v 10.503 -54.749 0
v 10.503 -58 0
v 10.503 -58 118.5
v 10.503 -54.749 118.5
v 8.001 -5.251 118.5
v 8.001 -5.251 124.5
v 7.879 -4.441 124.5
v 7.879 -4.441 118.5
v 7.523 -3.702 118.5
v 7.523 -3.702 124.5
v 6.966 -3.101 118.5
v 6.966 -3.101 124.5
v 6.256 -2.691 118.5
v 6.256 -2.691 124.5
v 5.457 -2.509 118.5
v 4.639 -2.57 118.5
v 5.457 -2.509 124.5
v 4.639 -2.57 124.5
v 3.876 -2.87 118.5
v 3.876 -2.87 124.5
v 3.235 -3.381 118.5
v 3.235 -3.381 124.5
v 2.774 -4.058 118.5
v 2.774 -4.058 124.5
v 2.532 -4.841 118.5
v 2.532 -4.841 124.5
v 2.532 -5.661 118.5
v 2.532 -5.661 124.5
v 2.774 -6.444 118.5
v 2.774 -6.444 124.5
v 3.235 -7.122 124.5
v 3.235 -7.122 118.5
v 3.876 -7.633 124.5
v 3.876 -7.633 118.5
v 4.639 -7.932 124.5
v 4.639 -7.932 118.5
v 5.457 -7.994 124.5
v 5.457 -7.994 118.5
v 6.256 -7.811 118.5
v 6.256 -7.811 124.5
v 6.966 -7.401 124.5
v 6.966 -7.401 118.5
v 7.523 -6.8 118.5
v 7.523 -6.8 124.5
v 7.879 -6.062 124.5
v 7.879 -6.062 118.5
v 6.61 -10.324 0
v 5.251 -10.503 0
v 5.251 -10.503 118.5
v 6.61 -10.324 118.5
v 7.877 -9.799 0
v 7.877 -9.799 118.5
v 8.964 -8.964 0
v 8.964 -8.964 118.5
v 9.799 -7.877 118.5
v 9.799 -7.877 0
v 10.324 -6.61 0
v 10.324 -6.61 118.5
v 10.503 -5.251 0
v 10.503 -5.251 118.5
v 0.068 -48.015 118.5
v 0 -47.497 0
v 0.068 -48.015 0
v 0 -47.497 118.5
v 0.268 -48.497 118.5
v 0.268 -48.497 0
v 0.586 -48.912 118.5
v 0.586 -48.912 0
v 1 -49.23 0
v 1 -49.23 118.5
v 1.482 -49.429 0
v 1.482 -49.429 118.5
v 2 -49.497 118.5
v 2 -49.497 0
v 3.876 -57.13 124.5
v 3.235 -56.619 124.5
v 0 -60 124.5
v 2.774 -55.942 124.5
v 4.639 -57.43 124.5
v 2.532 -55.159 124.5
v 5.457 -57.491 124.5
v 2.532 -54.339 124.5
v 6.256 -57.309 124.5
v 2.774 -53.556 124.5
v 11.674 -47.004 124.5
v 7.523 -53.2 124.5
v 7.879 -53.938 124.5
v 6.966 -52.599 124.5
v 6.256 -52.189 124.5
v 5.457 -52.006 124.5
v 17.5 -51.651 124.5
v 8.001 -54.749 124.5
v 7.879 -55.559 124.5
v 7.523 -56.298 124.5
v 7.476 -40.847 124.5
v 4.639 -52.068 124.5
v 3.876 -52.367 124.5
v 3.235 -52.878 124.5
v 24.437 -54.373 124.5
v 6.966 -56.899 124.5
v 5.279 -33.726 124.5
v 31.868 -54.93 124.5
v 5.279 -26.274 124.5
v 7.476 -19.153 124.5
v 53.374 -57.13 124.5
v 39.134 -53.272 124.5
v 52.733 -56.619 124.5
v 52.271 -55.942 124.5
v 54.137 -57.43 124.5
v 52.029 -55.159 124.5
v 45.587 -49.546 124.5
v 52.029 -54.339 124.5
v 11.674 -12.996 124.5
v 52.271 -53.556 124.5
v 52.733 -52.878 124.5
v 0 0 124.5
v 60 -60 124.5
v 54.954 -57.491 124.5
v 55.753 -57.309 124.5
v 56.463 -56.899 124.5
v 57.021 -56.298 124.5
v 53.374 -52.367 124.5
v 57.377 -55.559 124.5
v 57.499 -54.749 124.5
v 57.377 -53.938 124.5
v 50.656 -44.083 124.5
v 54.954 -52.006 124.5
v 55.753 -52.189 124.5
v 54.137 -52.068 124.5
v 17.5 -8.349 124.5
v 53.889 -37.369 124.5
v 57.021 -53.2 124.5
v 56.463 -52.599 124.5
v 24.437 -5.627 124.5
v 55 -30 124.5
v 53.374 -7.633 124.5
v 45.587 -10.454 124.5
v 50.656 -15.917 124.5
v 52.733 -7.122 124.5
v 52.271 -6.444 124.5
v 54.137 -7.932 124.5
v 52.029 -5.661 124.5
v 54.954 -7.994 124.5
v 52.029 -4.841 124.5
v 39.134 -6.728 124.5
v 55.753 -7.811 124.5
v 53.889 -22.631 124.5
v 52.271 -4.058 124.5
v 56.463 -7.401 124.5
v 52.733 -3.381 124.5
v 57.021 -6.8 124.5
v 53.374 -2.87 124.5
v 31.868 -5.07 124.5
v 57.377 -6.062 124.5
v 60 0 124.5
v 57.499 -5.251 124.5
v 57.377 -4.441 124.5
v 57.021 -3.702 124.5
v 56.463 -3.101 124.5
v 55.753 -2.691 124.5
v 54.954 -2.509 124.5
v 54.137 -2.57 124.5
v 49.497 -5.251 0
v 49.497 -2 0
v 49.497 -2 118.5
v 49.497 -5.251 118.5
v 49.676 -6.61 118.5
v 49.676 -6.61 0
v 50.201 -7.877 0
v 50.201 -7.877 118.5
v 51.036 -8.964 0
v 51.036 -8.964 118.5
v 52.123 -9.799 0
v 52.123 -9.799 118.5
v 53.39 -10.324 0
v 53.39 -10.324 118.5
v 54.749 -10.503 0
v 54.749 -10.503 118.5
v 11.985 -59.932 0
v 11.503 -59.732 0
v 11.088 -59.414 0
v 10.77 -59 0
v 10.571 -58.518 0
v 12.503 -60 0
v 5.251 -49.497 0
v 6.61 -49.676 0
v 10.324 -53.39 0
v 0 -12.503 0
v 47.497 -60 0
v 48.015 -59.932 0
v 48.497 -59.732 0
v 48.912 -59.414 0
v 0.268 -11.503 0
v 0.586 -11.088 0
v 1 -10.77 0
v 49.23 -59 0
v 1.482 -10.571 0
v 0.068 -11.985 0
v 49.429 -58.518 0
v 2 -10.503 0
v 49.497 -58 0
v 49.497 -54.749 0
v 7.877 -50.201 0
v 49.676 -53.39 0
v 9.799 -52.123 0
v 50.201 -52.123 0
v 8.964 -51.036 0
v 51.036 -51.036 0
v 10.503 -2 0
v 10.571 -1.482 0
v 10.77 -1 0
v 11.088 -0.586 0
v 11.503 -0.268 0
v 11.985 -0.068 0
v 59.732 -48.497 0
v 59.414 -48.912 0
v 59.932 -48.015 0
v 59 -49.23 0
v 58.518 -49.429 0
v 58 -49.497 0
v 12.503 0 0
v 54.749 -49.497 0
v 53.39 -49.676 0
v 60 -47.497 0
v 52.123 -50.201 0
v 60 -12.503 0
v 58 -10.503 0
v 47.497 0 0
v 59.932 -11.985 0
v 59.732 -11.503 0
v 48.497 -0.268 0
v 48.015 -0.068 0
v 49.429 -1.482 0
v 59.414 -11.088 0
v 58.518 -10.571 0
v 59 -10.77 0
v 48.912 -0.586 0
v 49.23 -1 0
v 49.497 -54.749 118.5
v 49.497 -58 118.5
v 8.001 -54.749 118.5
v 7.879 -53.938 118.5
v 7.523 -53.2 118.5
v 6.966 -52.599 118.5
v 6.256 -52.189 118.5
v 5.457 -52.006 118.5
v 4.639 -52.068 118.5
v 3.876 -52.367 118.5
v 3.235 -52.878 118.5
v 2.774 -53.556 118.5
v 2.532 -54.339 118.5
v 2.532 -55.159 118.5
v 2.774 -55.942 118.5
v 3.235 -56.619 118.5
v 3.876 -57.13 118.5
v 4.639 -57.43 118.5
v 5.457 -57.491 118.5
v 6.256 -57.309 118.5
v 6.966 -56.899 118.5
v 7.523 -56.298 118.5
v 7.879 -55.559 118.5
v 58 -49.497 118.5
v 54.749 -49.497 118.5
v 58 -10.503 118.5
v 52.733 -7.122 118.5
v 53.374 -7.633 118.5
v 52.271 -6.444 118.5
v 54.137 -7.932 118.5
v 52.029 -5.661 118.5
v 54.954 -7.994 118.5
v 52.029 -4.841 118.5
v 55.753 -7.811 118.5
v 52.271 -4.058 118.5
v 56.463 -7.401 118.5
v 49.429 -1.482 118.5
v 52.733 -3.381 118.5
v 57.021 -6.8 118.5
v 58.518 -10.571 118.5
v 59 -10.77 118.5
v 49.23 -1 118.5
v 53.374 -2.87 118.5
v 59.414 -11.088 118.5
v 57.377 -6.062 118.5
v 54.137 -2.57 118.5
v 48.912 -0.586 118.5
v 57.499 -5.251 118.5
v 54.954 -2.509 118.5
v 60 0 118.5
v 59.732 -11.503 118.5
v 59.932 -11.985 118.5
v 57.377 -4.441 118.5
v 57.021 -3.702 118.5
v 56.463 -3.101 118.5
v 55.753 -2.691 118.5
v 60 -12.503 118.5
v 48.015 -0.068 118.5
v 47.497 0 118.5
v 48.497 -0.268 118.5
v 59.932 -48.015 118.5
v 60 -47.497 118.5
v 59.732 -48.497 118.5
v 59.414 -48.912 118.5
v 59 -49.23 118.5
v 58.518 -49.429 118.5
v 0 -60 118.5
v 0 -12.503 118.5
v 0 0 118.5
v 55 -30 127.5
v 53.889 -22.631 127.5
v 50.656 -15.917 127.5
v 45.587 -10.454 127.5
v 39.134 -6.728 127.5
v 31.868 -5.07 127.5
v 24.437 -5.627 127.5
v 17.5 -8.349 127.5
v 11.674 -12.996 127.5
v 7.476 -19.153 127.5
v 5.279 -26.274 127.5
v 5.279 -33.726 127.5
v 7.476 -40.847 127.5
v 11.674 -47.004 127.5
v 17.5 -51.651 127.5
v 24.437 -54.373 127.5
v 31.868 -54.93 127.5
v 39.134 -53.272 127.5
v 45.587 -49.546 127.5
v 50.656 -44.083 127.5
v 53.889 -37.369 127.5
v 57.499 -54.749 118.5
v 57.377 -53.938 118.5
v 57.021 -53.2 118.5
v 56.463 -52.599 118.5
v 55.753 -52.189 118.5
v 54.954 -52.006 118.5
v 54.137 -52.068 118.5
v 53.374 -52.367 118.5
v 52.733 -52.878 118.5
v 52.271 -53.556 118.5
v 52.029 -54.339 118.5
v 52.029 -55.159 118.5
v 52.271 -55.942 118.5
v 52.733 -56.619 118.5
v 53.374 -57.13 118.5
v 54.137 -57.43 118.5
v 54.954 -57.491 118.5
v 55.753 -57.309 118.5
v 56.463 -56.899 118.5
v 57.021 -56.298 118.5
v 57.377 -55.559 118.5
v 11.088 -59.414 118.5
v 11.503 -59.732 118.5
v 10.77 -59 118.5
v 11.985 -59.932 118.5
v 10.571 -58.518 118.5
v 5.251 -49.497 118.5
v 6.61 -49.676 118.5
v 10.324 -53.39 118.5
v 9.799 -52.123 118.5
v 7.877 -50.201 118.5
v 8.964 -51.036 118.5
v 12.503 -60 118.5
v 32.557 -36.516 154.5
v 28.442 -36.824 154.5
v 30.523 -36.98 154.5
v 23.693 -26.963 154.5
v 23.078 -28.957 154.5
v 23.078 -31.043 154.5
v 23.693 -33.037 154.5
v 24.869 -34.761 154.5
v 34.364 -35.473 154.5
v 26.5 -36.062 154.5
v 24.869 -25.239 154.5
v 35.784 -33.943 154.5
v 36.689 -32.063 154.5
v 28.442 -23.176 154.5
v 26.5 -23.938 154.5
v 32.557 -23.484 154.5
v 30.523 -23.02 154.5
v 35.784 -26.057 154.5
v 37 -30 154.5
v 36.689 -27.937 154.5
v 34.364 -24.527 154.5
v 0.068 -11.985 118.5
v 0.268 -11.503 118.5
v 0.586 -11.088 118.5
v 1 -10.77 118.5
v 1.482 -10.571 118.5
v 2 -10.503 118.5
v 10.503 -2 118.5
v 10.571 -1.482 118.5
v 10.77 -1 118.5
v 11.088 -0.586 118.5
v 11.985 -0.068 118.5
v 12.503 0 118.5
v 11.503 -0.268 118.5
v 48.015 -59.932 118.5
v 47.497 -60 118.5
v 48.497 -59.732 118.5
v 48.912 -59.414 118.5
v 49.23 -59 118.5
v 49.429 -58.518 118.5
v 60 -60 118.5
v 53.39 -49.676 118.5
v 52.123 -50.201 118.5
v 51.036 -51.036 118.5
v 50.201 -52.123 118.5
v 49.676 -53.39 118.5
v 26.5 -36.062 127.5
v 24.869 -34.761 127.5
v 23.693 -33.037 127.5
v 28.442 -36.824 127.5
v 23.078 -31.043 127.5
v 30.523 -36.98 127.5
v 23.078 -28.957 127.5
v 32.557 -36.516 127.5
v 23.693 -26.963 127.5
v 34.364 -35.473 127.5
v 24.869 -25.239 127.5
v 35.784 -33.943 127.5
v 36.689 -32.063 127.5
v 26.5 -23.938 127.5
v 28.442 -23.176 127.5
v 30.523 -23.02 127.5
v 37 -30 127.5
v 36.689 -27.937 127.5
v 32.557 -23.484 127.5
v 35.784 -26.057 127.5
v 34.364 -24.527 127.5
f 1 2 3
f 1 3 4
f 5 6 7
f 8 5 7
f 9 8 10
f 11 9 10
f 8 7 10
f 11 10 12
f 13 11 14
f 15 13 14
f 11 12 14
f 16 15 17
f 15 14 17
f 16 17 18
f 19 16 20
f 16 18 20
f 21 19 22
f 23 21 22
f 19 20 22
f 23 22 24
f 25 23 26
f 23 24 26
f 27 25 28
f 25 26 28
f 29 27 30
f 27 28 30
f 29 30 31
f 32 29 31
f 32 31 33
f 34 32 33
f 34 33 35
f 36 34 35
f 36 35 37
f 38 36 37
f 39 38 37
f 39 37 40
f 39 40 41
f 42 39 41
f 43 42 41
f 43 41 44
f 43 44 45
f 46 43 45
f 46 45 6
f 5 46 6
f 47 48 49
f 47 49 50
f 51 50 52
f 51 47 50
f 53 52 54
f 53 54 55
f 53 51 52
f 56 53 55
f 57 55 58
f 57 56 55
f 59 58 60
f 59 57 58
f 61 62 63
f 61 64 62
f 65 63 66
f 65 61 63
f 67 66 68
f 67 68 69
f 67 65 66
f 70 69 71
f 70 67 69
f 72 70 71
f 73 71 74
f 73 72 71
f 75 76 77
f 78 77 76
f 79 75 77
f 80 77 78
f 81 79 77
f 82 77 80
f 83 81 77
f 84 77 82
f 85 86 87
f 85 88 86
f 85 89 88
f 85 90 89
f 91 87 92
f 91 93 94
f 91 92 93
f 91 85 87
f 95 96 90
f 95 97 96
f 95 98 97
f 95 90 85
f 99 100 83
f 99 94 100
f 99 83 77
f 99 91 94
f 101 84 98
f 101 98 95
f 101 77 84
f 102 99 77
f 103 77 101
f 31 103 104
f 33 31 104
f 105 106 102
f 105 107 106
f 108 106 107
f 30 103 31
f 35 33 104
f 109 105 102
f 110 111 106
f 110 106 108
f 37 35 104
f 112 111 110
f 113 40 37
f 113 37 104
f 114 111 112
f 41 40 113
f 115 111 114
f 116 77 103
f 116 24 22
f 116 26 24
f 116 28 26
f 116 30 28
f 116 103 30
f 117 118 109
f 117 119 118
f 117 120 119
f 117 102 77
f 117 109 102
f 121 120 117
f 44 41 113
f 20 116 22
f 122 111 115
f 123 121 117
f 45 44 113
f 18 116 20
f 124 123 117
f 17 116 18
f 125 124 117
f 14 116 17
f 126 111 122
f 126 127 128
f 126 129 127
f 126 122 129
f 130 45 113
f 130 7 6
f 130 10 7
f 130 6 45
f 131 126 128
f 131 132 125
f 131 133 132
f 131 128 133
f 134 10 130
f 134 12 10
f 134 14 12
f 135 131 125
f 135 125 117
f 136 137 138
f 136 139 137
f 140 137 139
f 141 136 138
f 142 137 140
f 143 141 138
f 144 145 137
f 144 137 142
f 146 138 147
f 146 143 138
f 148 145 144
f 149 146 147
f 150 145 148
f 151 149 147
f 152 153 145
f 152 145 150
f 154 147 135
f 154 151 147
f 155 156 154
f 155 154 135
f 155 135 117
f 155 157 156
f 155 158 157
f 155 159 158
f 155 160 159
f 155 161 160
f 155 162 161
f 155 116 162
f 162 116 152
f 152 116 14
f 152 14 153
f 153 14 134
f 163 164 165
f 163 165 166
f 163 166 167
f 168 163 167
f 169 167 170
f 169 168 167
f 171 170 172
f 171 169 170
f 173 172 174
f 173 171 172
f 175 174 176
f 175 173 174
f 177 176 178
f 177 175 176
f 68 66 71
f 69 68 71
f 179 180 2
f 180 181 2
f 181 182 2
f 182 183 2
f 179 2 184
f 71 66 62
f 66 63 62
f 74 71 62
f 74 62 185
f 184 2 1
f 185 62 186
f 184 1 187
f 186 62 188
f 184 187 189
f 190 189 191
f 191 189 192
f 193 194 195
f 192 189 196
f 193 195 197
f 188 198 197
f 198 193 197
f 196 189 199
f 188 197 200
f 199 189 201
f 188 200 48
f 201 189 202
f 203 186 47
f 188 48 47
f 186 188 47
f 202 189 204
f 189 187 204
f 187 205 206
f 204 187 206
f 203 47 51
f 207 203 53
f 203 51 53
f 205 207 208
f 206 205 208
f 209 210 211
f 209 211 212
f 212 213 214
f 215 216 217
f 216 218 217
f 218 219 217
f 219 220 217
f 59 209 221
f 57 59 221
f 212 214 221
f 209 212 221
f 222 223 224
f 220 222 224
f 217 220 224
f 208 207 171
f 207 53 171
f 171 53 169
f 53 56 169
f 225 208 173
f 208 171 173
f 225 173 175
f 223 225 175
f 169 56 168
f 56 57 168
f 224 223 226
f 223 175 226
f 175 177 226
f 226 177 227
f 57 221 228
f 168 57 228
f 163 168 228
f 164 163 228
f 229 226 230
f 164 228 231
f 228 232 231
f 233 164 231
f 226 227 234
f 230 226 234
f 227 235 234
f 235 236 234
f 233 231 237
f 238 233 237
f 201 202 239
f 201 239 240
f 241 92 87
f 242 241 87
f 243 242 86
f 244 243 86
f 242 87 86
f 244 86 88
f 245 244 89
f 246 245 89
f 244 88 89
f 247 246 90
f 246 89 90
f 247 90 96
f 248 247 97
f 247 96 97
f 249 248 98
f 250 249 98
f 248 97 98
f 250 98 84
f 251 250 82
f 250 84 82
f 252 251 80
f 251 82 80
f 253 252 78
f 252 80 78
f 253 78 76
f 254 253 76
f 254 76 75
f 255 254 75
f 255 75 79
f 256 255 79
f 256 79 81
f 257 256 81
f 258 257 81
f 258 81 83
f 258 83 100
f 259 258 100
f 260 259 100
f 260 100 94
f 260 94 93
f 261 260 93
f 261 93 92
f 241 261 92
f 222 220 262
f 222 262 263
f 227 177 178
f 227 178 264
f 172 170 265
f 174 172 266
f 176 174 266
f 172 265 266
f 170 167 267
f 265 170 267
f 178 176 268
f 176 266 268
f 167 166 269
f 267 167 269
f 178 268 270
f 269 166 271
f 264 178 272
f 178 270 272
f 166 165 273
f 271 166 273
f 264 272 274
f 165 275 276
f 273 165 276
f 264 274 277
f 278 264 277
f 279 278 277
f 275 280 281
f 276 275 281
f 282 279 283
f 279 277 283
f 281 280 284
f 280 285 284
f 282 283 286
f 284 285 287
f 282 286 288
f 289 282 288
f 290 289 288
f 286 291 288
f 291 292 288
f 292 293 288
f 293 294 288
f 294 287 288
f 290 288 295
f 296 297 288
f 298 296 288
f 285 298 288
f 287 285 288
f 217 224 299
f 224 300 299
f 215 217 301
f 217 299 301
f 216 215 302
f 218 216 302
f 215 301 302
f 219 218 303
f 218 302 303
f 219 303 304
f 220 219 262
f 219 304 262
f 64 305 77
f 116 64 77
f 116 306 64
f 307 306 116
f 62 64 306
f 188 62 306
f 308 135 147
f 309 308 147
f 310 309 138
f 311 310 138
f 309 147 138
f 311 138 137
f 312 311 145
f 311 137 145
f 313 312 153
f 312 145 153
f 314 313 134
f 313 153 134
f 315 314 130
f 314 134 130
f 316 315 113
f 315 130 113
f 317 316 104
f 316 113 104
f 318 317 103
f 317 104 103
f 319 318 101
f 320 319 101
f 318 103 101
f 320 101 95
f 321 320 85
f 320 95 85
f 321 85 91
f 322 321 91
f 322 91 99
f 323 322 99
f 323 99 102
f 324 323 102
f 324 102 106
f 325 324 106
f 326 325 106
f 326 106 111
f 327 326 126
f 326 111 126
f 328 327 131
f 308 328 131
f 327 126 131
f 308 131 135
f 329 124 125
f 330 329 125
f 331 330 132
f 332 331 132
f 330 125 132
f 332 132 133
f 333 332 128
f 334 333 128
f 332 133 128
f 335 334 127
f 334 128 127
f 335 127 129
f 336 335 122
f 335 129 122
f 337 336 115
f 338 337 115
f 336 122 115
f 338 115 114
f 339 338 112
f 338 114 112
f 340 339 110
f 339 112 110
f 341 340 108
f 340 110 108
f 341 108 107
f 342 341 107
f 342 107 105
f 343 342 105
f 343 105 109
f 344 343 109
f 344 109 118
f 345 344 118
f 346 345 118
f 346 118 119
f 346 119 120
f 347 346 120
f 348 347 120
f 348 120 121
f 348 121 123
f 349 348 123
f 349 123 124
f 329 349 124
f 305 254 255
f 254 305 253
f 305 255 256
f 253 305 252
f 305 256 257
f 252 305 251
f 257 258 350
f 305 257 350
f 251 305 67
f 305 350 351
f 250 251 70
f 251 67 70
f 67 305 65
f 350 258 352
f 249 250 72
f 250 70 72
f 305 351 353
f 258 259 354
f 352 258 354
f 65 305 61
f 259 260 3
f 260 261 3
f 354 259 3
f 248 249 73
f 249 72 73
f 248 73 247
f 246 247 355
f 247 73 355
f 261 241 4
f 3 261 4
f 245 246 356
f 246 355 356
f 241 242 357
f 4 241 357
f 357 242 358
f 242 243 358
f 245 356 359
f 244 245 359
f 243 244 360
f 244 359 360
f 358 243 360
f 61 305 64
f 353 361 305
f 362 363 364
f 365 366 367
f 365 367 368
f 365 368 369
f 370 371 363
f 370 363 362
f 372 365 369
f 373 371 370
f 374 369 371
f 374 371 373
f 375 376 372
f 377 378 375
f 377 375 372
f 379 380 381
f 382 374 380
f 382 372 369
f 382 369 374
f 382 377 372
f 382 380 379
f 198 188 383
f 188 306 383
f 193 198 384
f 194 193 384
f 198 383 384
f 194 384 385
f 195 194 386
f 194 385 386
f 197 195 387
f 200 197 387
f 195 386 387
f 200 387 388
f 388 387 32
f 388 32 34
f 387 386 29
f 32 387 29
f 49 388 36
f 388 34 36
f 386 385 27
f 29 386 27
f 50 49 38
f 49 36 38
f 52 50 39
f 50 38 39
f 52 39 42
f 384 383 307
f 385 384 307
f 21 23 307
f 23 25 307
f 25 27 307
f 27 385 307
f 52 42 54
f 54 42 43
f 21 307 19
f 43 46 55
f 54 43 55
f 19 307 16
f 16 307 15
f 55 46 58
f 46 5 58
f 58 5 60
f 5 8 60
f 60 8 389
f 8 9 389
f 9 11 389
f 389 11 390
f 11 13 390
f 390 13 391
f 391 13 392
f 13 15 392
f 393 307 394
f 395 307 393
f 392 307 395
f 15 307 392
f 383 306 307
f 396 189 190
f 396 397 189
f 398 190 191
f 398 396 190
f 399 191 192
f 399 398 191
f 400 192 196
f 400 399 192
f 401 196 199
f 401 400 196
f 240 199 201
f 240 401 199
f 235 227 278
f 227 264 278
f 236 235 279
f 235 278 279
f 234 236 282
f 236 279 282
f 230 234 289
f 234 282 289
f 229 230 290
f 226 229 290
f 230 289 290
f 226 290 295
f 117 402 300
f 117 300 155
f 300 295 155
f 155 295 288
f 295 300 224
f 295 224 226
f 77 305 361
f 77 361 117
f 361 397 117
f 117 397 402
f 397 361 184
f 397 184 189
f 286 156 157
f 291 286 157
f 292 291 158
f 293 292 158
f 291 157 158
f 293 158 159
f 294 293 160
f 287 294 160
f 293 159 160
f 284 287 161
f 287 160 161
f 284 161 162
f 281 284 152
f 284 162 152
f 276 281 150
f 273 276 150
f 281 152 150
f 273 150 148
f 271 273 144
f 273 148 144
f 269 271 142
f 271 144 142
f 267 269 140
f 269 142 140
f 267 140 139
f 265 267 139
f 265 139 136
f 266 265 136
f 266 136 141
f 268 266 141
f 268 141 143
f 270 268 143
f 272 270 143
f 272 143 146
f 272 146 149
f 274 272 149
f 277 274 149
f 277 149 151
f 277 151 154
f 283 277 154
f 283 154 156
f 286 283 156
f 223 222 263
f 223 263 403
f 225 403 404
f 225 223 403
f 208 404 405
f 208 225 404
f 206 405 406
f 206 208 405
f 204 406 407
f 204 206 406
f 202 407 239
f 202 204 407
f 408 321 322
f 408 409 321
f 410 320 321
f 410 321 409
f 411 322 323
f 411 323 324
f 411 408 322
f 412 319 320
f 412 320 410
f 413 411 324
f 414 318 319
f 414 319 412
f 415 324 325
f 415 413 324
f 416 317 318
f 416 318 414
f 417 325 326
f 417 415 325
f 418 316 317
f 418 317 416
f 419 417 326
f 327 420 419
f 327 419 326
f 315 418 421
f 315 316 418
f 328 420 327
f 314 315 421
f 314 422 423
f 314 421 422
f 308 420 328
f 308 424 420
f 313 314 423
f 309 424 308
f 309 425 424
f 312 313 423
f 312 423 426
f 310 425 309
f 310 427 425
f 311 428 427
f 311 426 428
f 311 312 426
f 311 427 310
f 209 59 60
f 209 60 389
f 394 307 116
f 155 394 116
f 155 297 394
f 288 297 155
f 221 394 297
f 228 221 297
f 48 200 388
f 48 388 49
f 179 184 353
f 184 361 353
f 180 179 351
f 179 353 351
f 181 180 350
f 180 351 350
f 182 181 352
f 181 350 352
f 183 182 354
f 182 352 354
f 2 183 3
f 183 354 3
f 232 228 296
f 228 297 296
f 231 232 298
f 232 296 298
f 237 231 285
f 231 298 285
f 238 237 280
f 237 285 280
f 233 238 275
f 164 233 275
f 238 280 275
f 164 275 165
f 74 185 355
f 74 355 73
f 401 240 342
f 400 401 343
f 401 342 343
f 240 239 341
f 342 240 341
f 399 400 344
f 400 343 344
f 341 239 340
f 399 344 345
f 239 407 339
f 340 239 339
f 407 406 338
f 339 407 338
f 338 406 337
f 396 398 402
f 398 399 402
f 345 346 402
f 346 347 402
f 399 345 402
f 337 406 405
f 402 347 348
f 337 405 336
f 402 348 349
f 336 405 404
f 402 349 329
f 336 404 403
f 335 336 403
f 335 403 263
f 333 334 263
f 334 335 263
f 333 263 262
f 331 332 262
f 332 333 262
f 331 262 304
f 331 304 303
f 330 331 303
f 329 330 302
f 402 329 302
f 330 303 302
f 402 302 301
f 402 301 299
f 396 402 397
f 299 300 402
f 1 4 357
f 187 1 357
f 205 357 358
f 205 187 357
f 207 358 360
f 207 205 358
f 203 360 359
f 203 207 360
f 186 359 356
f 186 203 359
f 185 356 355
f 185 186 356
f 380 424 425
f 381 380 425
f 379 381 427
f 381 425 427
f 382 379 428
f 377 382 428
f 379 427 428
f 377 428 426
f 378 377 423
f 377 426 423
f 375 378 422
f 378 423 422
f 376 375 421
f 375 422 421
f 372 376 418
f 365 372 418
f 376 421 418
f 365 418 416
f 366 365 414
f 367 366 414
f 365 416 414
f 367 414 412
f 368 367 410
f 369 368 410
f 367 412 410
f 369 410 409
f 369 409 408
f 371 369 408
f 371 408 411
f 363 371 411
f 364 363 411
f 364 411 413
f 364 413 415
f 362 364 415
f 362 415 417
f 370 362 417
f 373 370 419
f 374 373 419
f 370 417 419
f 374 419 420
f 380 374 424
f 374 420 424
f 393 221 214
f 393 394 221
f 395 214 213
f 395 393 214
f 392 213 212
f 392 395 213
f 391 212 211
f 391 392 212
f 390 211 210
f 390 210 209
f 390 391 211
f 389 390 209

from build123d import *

# Parameters (mm, degrees)
SKETCH_1_W          = 60
SKETCH_1_H          = 60
EXTRUDE_1_DEPTH     = 124.5
SKETCH_2_R          = 25
EXTRUDE_2_DEPTH     = 3
SKETCH_3_R          = 7
EXTRUDE_3_DEPTH     = 27
SKETCH_4_R          = 2.75
CUT_EXTRUDE_1_DEPTH = 151.666021385
CUT_EXTRUDE_2_DEPTH = 118.5
FILLET_1_R          = 2


with BuildPart() as part:
    # 草图1 → 拉伸1 (new body)
    with BuildSketch(Plane.XY):
        with Locations((30, -30)):
            Rectangle(SKETCH_1_W, SKETCH_1_H)
    extrude(amount=EXTRUDE_1_DEPTH)

    # 草图2 → 拉伸2 (add)
    with BuildSketch(Plane.XY.offset(124.5)):
        with Locations((30, -30)):
            Circle(SKETCH_2_R)
    extrude(amount=EXTRUDE_2_DEPTH)

    # 草图3 → 拉伸3 (add)
    with BuildSketch(Plane.XY.offset(127.5)):
        with Locations((30, -30)):
            Circle(SKETCH_3_R)
    extrude(amount=EXTRUDE_3_DEPTH)

    # 草图4 → 切除-拉伸1 (cut, through all)
    with BuildSketch(Plane.XY.offset(124.5)):
        with Locations((54.748737342, -5.251262658)):
            Circle(SKETCH_4_R)
        with Locations((54.748737342, -54.748737342)):
            Circle(SKETCH_4_R)
        with Locations((5.251262658, -54.748737342)):
            Circle(SKETCH_4_R)
        with Locations((5.251262658, -5.251262658)):
            Circle(SKETCH_4_R)
    extrude(amount=-CUT_EXTRUDE_1_DEPTH, mode=Mode.SUBTRACT)

    # 草图5 → 切除-拉伸2 (cut)
    with BuildSketch(Plane(origin=(0, 0, 0), x_dir=(-1, 0, 0), z_dir=(0, 0, -1))):
        with BuildLine():
            Line((-10.502525317, -5.251262658), (-10.502525317, 0))
            Line((-10.502525317, 0), (0, 0))
            Line((0, 0), (0, -10.502525317))
            Line((0, -10.502525317), (-5.251262658, -10.502525317))
            ThreePointArc((-5.251262658, -10.502525317), (-8.964466094, -8.964466094), (-10.502525317, -5.251262658))
        make_face()
        with BuildLine():
            Line((-49.497474683, -54.748737342), (-49.497474683, -60))
            Line((-49.497474683, -60), (-60, -60))
            Line((-60, -60), (-60, -49.497474683))
            Line((-60, -49.497474683), (-54.748737342, -49.497474683))
            ThreePointArc((-54.748737342, -49.497474683), (-51.035533906, -51.035533906), (-49.497474683, -54.748737342))
        make_face()
        with BuildLine():
            Line((-60, 0), (-49.497474683, 0))
            Line((-49.497474683, 0), (-49.497474683, -5.251262658))
            ThreePointArc((-49.497474683, -5.251262658), (-51.035533906, -8.964466094), (-54.748737342, -10.502525317))
            Line((-54.748737342, -10.502525317), (-60, -10.502525317))
            Line((-60, -10.502525317), (-60, 0))
        make_face()
        with BuildLine():
            Line((0, -60), (-10.502525317, -60))
            Line((-10.502525317, -60), (-10.502525317, -54.748737342))
            ThreePointArc((-10.502525317, -54.748737342), (-8.964466094, -51.035533906), (-5.251262658, -49.497474683))
            Line((-5.251262658, -49.497474683), (0, -49.497474683))
            Line((0, -49.497474683), (0, -60))
        make_face()
    extrude(amount=-CUT_EXTRUDE_2_DEPTH, mode=Mode.SUBTRACT)

    # 圆角1
    fillet_1_edges = [part.edges().sort_by_distance(p)[0] for p in [
        (10.502525317, 0, 59.25),
        (0, -10.502525317, 59.25),
        (49.497474683, -60, 59.25),
        (60, -49.497474683, 59.25),
        (60, -10.502525317, 59.25),
        (49.497474683, 0, 59.25),
        (0, -49.497474683, 59.25),
        (10.502525317, -60, 59.25),
    ]]
    fillet(fillet_1_edges, radius=FILLET_1_R)


solid = part.part
